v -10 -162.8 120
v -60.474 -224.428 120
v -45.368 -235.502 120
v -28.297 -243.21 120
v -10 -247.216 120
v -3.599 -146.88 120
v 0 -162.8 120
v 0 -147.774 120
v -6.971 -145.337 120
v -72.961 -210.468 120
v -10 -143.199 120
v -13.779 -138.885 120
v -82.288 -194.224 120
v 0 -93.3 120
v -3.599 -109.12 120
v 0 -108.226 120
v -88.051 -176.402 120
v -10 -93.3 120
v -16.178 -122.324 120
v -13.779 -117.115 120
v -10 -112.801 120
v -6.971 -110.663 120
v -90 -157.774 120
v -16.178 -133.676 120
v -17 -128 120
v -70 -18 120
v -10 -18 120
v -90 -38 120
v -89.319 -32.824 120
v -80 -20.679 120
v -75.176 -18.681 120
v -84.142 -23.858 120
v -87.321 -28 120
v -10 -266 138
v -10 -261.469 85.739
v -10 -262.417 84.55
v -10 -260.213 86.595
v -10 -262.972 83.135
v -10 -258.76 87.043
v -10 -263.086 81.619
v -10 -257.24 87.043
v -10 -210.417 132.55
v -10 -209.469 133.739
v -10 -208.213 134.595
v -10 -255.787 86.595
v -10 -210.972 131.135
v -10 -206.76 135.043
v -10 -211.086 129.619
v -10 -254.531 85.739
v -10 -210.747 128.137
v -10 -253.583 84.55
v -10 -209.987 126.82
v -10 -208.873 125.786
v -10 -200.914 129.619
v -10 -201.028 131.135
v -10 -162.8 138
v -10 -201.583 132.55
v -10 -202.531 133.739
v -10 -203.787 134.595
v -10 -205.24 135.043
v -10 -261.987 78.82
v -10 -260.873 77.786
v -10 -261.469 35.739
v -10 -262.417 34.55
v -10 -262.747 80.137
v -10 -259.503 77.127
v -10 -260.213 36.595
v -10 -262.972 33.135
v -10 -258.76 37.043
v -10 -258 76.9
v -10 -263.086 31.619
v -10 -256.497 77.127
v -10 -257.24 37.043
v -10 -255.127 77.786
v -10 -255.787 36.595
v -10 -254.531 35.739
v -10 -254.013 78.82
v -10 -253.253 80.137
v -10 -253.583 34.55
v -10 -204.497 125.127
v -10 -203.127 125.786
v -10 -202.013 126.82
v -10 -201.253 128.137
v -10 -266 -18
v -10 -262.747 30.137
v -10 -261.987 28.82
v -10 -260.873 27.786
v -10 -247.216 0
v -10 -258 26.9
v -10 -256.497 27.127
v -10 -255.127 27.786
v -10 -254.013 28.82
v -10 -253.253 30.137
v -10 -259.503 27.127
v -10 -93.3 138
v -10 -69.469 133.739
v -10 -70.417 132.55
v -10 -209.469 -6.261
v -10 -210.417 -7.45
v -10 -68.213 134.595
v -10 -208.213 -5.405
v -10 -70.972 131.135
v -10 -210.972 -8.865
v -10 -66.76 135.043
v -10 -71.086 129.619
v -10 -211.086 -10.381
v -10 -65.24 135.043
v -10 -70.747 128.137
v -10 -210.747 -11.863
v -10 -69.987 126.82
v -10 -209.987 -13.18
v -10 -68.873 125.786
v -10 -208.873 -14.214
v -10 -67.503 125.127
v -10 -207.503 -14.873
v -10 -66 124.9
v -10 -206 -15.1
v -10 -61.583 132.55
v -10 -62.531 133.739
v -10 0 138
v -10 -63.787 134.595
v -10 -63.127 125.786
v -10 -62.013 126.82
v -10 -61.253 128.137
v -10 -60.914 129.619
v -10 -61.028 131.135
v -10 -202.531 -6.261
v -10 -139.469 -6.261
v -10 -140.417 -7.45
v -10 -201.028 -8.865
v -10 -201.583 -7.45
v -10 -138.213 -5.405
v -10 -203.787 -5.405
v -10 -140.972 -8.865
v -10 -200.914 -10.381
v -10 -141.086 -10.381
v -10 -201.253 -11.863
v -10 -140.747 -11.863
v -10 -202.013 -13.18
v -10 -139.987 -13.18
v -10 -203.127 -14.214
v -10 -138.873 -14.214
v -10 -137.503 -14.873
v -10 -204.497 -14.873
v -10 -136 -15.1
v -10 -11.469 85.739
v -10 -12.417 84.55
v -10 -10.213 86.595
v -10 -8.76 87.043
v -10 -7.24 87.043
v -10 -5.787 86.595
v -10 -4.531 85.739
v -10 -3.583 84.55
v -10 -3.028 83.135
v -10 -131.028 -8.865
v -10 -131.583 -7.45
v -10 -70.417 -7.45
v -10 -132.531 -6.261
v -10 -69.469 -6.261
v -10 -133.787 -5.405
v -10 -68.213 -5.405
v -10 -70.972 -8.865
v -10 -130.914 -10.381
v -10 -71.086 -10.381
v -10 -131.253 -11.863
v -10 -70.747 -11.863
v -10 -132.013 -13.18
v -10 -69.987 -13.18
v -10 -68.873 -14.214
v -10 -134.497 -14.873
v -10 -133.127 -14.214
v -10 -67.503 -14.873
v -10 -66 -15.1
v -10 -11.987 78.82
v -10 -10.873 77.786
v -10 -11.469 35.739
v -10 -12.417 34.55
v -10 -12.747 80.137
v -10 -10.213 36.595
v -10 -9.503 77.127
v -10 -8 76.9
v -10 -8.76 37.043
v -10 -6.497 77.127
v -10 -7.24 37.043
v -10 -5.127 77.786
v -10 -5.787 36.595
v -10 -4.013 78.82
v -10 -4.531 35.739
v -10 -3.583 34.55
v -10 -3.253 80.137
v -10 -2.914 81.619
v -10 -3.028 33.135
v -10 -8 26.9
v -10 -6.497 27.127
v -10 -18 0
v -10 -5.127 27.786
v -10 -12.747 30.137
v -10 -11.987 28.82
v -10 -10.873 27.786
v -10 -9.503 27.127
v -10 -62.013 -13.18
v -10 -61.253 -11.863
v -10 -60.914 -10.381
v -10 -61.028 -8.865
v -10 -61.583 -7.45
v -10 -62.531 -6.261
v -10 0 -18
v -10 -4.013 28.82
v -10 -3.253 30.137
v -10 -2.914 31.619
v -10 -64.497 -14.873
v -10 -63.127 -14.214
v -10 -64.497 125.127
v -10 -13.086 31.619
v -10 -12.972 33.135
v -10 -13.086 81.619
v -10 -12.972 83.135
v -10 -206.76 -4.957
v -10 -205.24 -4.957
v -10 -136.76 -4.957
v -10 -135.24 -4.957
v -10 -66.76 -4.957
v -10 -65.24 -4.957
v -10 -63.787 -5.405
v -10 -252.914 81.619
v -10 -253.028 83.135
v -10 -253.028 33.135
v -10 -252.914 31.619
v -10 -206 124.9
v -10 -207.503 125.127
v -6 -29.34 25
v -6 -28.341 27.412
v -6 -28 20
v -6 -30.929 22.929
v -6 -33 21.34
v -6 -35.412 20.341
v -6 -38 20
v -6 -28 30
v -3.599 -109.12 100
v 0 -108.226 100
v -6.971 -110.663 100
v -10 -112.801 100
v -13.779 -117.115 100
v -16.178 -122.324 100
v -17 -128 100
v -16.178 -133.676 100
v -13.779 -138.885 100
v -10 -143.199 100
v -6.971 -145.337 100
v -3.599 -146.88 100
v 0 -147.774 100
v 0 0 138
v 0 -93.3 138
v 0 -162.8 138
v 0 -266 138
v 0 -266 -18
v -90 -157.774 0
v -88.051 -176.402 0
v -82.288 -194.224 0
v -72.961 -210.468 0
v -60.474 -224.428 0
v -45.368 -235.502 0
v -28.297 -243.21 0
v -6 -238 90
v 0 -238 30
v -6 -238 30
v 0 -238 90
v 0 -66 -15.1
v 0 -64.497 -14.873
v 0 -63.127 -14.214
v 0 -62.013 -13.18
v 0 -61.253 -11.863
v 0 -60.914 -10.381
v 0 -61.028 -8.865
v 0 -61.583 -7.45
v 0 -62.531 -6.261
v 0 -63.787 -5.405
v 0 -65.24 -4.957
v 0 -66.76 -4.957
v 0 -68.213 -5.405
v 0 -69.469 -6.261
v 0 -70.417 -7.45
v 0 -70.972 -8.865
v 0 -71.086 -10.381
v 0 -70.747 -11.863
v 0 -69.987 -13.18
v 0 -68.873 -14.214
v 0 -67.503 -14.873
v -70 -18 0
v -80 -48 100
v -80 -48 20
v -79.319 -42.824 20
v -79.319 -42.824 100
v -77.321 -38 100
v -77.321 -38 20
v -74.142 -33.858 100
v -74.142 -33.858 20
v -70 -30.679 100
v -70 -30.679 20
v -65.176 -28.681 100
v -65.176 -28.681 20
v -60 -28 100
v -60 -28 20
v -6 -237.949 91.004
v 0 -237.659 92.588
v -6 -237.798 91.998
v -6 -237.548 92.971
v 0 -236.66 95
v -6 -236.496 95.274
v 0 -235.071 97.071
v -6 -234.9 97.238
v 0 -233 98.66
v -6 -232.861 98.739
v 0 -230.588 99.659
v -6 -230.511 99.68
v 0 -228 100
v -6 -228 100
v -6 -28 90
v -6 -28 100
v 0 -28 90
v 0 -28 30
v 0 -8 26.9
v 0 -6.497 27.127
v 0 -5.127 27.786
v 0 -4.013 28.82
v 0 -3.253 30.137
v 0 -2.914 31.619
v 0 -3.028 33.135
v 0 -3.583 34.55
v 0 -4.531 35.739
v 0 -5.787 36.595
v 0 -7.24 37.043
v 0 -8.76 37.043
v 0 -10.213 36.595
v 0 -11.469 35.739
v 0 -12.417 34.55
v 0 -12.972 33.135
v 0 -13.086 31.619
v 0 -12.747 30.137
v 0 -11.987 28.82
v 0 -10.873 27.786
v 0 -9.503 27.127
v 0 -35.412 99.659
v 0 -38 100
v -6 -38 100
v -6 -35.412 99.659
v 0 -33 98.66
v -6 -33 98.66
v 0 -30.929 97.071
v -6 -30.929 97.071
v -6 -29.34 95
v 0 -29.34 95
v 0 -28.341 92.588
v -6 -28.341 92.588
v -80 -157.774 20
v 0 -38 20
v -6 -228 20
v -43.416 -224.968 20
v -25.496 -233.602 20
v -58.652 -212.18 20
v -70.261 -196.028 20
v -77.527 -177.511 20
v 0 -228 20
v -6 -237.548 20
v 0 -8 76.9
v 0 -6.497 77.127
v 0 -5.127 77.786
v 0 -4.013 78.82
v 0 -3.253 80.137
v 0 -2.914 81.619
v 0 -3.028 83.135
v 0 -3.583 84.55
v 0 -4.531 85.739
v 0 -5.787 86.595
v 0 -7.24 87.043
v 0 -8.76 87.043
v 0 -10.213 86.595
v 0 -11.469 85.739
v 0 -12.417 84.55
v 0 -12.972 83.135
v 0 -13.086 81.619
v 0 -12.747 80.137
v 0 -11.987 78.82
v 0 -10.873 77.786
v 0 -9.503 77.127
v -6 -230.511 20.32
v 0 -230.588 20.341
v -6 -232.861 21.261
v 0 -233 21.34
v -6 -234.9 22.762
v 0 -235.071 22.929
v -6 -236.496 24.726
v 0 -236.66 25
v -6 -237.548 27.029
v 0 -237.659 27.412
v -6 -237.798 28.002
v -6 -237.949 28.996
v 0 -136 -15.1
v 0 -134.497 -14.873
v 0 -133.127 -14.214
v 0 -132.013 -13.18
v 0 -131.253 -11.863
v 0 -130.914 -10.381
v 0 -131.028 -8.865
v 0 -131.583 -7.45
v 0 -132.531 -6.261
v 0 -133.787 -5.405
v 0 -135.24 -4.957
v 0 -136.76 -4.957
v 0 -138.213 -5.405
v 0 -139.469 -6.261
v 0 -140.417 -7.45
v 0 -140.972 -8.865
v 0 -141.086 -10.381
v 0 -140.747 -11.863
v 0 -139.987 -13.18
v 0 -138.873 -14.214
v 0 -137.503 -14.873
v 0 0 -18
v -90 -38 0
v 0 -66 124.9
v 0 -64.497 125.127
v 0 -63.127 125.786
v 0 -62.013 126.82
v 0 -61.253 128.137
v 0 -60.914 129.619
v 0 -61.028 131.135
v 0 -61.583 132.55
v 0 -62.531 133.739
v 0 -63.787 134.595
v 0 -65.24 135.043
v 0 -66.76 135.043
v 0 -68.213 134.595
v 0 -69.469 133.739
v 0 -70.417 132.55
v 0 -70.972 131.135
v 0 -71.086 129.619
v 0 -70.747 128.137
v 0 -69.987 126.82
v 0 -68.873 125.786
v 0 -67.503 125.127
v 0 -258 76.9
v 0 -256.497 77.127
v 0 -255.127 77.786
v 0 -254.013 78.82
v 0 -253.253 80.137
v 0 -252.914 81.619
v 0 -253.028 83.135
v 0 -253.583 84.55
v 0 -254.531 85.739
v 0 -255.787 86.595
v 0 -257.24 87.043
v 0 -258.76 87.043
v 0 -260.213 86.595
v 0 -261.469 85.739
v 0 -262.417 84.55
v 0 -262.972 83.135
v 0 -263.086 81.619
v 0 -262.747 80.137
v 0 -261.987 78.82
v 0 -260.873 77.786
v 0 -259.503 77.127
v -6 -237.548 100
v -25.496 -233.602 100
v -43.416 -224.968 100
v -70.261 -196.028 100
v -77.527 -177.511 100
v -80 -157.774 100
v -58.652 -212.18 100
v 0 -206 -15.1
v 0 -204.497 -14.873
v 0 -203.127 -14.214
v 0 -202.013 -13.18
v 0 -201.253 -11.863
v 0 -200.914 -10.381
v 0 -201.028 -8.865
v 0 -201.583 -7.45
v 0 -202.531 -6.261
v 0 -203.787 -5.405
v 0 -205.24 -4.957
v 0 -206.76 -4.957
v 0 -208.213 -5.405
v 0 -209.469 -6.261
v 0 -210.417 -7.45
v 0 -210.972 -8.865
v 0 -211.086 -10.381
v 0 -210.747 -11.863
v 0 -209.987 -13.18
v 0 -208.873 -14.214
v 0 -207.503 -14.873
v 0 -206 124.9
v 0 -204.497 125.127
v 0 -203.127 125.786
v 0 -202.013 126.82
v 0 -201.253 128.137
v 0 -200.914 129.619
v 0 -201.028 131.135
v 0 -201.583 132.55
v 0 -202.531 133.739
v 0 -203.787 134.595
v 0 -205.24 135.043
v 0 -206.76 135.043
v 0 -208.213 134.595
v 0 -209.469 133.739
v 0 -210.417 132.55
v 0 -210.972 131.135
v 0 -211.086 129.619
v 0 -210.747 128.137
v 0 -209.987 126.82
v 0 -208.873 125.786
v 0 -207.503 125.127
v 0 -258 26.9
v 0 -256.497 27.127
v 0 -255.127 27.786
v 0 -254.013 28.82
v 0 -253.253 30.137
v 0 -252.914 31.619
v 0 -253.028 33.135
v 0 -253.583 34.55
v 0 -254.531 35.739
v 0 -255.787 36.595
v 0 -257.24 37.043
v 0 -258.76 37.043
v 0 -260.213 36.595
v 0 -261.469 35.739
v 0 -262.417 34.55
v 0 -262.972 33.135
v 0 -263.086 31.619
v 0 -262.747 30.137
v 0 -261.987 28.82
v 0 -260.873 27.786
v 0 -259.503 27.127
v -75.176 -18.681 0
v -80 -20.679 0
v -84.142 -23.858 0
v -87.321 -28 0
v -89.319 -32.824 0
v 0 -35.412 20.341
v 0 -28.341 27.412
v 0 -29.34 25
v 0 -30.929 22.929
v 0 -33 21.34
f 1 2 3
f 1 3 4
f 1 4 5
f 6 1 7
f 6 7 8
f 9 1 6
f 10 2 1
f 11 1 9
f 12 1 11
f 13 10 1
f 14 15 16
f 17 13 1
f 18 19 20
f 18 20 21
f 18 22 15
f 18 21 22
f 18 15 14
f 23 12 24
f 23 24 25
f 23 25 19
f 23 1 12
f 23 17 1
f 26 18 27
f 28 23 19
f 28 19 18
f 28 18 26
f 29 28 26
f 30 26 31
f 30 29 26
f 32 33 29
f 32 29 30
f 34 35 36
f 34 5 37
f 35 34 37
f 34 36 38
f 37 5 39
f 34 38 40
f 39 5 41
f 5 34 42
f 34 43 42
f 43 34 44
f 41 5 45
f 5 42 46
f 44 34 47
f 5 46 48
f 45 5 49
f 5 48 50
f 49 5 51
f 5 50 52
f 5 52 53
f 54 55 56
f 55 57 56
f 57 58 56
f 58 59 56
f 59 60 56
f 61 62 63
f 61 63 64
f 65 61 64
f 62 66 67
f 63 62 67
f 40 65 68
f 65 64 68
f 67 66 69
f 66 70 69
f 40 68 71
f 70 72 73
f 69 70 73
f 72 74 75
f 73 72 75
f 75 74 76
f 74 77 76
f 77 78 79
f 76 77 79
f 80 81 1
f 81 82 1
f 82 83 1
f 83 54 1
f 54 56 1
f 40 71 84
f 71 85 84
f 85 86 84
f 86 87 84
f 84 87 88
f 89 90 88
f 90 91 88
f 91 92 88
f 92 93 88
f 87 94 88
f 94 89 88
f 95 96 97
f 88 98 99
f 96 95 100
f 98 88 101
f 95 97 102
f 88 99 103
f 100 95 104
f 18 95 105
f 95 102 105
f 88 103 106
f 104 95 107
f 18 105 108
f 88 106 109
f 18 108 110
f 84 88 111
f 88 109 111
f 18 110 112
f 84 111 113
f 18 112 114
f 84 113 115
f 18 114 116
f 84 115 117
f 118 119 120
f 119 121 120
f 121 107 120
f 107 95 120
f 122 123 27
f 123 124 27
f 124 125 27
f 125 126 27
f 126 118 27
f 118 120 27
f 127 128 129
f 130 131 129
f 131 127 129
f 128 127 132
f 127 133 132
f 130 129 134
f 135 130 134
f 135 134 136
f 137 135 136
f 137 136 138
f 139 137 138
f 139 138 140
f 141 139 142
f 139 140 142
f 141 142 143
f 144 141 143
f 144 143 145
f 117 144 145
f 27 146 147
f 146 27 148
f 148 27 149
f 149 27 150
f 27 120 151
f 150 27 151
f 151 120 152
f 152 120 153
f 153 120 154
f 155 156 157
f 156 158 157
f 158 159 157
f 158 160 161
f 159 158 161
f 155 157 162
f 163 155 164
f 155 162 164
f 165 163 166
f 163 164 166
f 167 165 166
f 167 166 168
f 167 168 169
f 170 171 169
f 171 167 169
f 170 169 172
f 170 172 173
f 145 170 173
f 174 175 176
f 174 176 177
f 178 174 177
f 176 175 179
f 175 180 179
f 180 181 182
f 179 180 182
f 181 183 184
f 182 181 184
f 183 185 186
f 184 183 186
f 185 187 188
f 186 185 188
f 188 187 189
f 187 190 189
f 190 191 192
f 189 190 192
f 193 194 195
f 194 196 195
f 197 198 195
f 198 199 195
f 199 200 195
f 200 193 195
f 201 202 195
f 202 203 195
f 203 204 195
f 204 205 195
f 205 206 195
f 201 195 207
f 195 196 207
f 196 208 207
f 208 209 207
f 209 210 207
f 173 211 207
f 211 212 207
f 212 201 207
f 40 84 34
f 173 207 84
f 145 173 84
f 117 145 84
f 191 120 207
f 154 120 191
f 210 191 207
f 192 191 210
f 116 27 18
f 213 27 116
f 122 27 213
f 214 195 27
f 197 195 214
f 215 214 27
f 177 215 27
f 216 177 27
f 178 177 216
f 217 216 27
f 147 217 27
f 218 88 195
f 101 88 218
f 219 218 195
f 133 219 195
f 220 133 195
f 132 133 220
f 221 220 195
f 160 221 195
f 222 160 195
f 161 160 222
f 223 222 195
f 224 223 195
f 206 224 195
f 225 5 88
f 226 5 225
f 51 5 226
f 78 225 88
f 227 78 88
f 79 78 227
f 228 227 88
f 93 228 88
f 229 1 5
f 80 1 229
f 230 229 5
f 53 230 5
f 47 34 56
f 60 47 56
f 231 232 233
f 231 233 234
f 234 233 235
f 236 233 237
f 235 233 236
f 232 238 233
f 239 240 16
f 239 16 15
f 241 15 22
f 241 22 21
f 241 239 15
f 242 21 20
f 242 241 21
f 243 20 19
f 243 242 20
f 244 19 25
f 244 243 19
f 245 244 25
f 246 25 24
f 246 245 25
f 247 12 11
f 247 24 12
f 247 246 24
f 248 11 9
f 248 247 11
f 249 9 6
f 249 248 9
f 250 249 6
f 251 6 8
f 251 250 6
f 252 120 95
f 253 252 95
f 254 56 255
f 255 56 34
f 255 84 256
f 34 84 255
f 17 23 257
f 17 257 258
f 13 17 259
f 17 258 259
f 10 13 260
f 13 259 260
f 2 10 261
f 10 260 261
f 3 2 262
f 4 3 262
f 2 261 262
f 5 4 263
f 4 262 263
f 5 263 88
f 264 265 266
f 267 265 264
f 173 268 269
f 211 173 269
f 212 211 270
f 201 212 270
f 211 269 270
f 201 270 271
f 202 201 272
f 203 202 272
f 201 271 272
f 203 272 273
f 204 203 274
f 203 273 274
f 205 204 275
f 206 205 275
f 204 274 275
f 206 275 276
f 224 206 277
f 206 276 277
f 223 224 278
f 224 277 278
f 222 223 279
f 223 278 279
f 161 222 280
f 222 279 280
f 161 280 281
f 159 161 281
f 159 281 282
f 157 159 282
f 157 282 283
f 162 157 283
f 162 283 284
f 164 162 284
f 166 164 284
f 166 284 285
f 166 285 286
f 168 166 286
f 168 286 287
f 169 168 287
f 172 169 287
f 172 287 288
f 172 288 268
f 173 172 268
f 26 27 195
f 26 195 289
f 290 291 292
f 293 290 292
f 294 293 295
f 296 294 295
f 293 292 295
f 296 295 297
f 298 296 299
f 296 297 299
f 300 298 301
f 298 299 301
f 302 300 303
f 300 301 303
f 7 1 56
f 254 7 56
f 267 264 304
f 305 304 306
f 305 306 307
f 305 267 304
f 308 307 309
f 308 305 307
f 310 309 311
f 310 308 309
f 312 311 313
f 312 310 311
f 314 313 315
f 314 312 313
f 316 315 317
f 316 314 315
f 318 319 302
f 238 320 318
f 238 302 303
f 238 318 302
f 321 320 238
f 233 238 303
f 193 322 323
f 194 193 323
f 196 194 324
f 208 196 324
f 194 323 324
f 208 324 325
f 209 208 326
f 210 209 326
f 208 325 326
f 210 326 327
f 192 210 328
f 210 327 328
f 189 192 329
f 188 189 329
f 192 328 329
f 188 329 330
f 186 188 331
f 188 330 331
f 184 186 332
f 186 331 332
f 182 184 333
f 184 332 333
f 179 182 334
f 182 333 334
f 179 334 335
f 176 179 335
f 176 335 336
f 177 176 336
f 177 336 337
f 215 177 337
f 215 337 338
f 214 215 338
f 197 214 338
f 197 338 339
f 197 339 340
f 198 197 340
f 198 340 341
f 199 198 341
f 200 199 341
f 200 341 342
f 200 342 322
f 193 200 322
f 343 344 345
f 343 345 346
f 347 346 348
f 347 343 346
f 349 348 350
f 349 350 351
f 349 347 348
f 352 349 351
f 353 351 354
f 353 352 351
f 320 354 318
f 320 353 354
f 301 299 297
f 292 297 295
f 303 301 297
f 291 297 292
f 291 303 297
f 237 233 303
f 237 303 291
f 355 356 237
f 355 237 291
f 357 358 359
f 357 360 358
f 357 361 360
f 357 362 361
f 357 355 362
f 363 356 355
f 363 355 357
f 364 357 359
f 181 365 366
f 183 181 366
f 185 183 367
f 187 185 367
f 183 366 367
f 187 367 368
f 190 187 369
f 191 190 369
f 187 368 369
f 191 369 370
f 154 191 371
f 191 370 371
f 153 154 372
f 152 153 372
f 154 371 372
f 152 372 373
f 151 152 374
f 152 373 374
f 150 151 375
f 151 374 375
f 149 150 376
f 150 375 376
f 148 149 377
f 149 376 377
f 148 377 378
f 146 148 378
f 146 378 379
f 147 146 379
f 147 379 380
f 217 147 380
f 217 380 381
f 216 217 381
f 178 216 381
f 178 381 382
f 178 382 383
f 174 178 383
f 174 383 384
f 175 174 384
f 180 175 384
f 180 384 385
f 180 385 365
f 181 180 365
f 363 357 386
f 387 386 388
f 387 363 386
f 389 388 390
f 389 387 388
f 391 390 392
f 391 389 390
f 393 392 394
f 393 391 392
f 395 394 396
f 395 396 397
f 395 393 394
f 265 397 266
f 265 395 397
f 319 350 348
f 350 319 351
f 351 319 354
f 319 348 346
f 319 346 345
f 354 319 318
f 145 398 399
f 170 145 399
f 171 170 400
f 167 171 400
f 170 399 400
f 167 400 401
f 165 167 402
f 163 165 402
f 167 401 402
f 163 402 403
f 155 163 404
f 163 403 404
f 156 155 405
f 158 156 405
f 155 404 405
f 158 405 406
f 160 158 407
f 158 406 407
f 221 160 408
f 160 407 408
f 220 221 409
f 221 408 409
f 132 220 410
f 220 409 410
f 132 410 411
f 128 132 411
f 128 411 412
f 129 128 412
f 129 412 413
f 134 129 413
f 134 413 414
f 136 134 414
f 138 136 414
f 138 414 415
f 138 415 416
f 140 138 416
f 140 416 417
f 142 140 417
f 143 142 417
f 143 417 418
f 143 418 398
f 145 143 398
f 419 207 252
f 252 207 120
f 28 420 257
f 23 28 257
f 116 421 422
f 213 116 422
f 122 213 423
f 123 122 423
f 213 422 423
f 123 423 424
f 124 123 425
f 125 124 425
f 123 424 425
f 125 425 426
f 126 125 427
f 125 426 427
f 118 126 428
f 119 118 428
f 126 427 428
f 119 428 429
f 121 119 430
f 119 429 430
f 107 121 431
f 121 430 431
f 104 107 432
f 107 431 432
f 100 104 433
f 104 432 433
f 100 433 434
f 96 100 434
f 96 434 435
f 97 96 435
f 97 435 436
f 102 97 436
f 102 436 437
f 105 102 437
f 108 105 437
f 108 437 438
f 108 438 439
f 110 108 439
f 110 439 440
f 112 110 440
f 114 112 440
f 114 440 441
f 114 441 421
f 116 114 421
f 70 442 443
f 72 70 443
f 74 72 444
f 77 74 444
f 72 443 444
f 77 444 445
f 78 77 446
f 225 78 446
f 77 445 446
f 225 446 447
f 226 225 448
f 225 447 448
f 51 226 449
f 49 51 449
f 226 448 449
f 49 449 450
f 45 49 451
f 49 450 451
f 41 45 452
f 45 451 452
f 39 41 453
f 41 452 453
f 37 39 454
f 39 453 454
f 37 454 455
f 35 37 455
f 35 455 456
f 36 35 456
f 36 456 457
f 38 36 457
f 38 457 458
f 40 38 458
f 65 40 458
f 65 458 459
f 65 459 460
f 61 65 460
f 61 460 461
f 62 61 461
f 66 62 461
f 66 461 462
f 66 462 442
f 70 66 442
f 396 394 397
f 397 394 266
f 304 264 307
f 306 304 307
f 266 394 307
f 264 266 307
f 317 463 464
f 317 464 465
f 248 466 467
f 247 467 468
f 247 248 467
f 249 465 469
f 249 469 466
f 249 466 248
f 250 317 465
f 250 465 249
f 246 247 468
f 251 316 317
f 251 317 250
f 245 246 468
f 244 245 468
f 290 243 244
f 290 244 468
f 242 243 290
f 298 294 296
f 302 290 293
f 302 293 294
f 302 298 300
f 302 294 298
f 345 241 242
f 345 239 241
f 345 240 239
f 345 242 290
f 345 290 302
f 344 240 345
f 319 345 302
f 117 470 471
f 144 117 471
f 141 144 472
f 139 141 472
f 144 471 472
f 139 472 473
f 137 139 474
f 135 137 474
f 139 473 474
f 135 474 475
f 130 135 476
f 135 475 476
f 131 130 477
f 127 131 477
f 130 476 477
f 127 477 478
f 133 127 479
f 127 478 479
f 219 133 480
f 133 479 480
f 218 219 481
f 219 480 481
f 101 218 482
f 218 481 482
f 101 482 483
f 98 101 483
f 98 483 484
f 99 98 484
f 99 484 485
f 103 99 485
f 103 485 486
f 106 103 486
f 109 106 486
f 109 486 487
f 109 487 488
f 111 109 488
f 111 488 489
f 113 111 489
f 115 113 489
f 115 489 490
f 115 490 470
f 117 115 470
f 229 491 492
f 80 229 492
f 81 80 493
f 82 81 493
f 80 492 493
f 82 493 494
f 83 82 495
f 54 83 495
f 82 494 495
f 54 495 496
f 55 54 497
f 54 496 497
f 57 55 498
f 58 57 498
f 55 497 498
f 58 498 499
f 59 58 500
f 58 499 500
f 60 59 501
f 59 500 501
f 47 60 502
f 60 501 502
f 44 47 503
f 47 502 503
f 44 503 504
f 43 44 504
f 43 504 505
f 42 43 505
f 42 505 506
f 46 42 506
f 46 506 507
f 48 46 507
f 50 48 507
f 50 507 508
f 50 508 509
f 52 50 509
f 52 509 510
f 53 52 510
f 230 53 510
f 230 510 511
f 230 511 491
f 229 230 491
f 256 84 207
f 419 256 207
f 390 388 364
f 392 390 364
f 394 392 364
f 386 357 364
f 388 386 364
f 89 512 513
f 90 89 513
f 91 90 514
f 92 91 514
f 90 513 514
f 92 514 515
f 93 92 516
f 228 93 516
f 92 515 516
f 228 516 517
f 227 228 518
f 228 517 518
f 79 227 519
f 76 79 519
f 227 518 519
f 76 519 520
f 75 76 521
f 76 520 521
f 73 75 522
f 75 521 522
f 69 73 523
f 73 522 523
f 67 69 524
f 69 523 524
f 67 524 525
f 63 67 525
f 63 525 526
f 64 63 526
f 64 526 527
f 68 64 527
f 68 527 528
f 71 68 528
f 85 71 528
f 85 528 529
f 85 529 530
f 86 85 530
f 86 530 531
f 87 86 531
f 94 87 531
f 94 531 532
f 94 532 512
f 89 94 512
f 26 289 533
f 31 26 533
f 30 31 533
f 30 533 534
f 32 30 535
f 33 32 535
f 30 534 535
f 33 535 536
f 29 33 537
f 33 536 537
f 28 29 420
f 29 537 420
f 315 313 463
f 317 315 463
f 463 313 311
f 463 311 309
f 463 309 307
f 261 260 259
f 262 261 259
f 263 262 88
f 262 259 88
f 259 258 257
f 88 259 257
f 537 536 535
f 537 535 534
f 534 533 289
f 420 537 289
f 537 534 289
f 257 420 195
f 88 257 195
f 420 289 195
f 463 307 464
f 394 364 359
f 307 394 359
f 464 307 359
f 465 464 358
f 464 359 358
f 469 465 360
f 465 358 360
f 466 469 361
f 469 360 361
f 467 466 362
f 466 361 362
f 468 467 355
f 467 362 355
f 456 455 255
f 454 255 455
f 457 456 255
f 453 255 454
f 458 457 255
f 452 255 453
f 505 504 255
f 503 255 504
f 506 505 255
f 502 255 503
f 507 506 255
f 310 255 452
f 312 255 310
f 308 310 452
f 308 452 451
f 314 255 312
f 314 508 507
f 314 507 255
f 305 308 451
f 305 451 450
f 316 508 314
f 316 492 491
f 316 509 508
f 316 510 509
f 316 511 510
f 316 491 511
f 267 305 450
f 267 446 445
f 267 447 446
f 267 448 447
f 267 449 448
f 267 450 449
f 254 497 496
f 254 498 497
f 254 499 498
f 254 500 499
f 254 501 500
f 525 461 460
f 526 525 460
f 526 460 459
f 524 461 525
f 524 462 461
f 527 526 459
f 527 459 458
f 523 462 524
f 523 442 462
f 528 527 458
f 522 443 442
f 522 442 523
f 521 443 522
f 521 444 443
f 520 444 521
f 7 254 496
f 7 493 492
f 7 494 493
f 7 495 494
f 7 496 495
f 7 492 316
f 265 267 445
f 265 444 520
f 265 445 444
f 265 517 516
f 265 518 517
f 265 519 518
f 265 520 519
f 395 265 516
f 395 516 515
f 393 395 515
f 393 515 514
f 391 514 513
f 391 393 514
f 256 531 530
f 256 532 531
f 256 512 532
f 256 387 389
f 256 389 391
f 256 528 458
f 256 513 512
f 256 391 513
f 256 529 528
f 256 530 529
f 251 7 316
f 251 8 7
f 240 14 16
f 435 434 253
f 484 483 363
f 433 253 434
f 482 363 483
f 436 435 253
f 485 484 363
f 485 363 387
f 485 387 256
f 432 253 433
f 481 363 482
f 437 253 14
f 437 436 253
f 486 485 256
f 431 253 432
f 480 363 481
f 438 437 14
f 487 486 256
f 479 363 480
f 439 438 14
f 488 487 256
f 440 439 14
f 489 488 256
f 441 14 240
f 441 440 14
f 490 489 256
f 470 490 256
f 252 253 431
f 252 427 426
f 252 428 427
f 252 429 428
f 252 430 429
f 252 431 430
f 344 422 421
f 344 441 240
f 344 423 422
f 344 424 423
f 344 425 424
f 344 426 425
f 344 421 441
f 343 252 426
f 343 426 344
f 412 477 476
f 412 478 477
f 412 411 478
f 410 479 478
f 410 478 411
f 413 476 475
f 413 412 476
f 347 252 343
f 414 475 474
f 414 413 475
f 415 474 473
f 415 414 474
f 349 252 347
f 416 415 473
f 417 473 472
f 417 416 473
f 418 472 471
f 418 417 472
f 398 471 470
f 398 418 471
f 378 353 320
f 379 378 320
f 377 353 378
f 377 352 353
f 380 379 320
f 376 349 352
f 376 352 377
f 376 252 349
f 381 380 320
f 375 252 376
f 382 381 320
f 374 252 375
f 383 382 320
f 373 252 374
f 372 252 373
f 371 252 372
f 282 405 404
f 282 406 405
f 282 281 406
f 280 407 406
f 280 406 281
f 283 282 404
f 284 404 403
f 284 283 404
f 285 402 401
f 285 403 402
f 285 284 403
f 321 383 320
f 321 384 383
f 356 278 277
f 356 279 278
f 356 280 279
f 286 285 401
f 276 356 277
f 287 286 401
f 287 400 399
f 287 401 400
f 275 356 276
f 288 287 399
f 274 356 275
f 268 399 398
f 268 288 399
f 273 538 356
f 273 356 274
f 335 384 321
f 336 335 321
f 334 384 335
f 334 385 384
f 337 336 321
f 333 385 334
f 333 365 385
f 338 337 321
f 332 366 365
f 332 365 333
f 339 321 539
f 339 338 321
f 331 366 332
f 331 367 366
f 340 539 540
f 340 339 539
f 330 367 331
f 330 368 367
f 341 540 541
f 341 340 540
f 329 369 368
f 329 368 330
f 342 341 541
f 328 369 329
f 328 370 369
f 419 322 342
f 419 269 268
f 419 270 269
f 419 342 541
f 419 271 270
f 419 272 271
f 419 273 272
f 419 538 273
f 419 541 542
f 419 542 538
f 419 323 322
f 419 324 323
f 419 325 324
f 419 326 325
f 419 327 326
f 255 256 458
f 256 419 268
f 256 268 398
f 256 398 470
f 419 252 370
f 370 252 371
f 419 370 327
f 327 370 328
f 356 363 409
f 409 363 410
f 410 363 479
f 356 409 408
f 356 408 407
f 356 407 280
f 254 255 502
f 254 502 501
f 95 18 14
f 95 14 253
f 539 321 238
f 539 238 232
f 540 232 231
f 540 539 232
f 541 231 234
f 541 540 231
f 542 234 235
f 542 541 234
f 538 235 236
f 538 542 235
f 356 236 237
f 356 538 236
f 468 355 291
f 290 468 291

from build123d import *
from build123d.topology import SkipClean

# Parameters (mm, degrees)
BOSS_EXTRUDE2_DEPTH     = 120
CUT_EXTRUDE1_DEPTH      = 10
CUT_EXTRUDE1_DEPTH_BACK = 18
BOSS_EXTRUDE3_DEPTH     = 10
F_1_0MM_DOWEL_HOLE1_D   = 10.2
SKETCH8_W               = 18
SKETCH8_H               = 69.5
CUT_EXTRUDE2_DEPTH      = 10
CUT_EXTRUDE3_START      = -20
CUT_EXTRUDE3_DEPTH      = 20
CUT_EXTRUDE4_DEPTH      = 80
CUT_EXTRUDE5_DEPTH      = 6


with BuildPart() as part:
    # Sketch2 → Boss-Extrude2 (new body)
    with BuildSketch(Plane.XY):
        with BuildLine():
            Line((0, -67.773719933), (0, -28))
            Line((0, -28), (-60, -28))
            ThreePointArc((-60, -28), (-74.142135624, -33.857864376), (-80, -48))
            Line((-80, -48), (-80, -157.773719933))
            ThreePointArc((-80, -157.773719933), (-56.568542495, -214.342262428), (0, -237.773719933))
            Line((0, -237.773719933), (0, -147.773719933))
            Line((0, -147.773719933), (0, -108.226280067))
            Line((0, -108.226280067), (0, -77.773719933))
            Line((0, -77.773719933), (0, -67.773719933))
        make_face()
        with BuildLine():
            Line((0, -28), (0, 0))
            Line((0, 0), (-10, 0))
            Line((-10, 0), (-10, -18))
            Line((-10, -18), (-70, -18))
            ThreePointArc((-70, -18), (-84.142135624, -23.857864376), (-90, -38))
            Line((-90, -38), (-90, -157.773719933))
            ThreePointArc((-90, -157.773719933), (-67.082039325, -217.773719933), (-10, -247.216439033))
            Line((-10, -247.216439033), (-10, -266))
            Line((-10, -266), (0, -266))
            Line((0, -266), (0, -237.773719933))
            ThreePointArc((0, -237.773719933), (-56.568542495, -214.342262428), (-80, -157.773719933))
            Line((-80, -157.773719933), (-80, -48))
            ThreePointArc((-80, -48), (-74.142135624, -33.857864376), (-60, -28))
            Line((-60, -28), (0, -28))
        make_face()
    extrude(amount=BOSS_EXTRUDE2_DEPTH)

    # Sketch3 → Cut-Extrude1 (cut, two sides: drawn at the far end of the back side and taken through both)
    with BuildSketch(Plane.XY.offset(120).offset(-CUT_EXTRUDE1_DEPTH_BACK)):
        with BuildLine():
            Line((0, -147.773719933), (0, -108.226280067))
            ThreePointArc((0, -108.226280067), (-17, -128), (0, -147.773719933))
        make_face()
    extrude(amount=CUT_EXTRUDE1_DEPTH + CUT_EXTRUDE1_DEPTH_BACK, mode=Mode.SUBTRACT)

    # Sketch5 → Boss-Extrude3 (add)
    with BuildSketch(Plane.ZY.offset(10)):
        Polygon((0, -266), (-18, -266), (-18, 0), (138, 0), (138, -266), (120, -266), align=None)
    extrude(amount=-BOSS_EXTRUDE3_DEPTH)

    # Ø1.0mm Dowel Hole1 (through all)
    with Locations(Plane.ZY.offset(10)):
        with Locations((32, -8), (82, -8), (-10, -66), (-10, -136), (-10, -206), (32, -258), (82, -258), (130, -206), (130, -66)):
            Hole(F_1_0MM_DOWEL_HOLE1_D / 2)

    # Sketch8 → Cut-Extrude2 (cut)
    with BuildSketch(Plane.ZY.offset(10)):
        with Locations((129, -128.05)):
            Rectangle(SKETCH8_W, SKETCH8_H)
    extrude(amount=-CUT_EXTRUDE2_DEPTH, mode=Mode.SUBTRACT)

    # Sketch9 → Cut-Extrude3 (cut)
    with SkipClean():  # the faces are left unmerged after this step: merging them gives an invalid solid
        with BuildSketch(Plane.XY.offset(120).offset(CUT_EXTRUDE3_START)):
            with BuildLine():
                Line((0, -147.773719933), (0, -108.226280067))
                ThreePointArc((0, -108.226280067), (-5.320621257, -109.812991947), (-10, -112.801315846))
                Line((-10, -112.801315846), (-10, -143.198684154))
                ThreePointArc((-10, -143.198684154), (-5.320621257, -146.187008053), (0, -147.773719933))
            make_face()
            with BuildLine():
                ThreePointArc((-10, -143.198684154), (-17, -128), (-10, -112.801315846))
                Line((-10, -112.801315846), (-10, -143.198684154))
            make_face()
        extrude(amount=CUT_EXTRUDE3_DEPTH, mode=Mode.SUBTRACT)

    # Sketch12 → Cut-Extrude4 (cut)
    with BuildSketch(Plane(origin=(0, 0, 20), x_dir=(-1, 0, 0), z_dir=(0, 0, -1))):
        with BuildLine():
            Line((60, -28), (6, -28))
            Line((6, -28), (6, -237.548402634))
            ThreePointArc((6, -237.548402634), (58.651513194, -212.179601968), (80, -157.773719933))
            Line((80, -157.773719933), (80, -48))
            ThreePointArc((80, -48), (74.142135624, -33.857864376), (60, -28))
        make_face()
    extrude(amount=-CUT_EXTRUDE4_DEPTH, mode=Mode.SUBTRACT)

    # Sketch10 → Cut-Extrude5 (cut)
    with BuildSketch(Plane(origin=(0, 0, 0), x_dir=(0, 0, -1), z_dir=(1, 0, 0))):
        with BuildLine():
            Line((-30, -238), (-90, -238))
            ThreePointArc((-90, -238), (-97.071067812, -235.071067812), (-100, -228))
            Line((-100, -228), (-100, -38))
            ThreePointArc((-100, -38), (-97.071067812, -30.928932188), (-90, -28))
            Line((-90, -28), (-30, -28))
            ThreePointArc((-30, -28), (-22.928932188, -30.928932188), (-20, -38))
            Line((-20, -38), (-20, -228))
            ThreePointArc((-20, -228), (-22.928932188, -235.071067812), (-30, -238))
        make_face()
    extrude(amount=-CUT_EXTRUDE5_DEPTH, mode=Mode.SUBTRACT)


solid = part.part
